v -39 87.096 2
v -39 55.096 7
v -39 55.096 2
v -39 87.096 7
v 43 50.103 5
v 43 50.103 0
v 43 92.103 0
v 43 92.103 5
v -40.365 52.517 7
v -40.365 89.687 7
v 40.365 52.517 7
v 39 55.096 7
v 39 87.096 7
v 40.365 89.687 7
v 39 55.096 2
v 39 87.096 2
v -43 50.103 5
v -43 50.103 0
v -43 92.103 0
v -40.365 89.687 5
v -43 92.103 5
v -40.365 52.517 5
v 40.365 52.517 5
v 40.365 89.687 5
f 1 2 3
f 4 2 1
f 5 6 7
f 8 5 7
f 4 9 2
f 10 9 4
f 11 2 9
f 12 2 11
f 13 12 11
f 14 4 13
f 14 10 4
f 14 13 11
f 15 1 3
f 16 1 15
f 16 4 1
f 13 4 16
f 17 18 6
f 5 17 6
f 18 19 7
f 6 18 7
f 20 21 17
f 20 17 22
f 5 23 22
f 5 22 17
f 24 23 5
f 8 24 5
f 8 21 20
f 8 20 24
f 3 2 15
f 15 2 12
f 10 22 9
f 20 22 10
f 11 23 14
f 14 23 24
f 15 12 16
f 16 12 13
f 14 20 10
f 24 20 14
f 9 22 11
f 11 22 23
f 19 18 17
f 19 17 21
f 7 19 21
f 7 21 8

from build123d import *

# Parameters (mm, degrees)
SKETCH010_W     = 86
SKETCH010_H     = 42
PAD004_DEPTH    = 5
SKETCH012_W     = 80.73
SKETCH012_H     = 37.17
PAD005_DEPTH    = 2
SKETCH013_W     = 78
SKETCH013_H     = 32
POCKET006_DEPTH = 5


with BuildPart() as part:
    # Sketch010 → Pad004 (new body)
    with BuildSketch(Plane.XY):
        with Locations((0, 71.102745)):
            Rectangle(SKETCH010_W, SKETCH010_H)
    extrude(amount=PAD004_DEPTH)

    # Sketch012 (on Face6 of Pad004) → Pad005 (join)
    with BuildSketch(Plane.XY.offset(5)):
        with Locations((0, 71.102234)):
            Rectangle(SKETCH012_W, SKETCH012_H)
    extrude(amount=PAD005_DEPTH)

    # Sketch013 (on Face11 of Pad005) → Pocket006 (cut)
    with BuildSketch(Plane.XY.offset(7)):
        with Locations((0, 71.096275)):
            Rectangle(SKETCH013_W, SKETCH013_H)
    extrude(amount=-POCKET006_DEPTH, mode=Mode.SUBTRACT)


solid = part.part
